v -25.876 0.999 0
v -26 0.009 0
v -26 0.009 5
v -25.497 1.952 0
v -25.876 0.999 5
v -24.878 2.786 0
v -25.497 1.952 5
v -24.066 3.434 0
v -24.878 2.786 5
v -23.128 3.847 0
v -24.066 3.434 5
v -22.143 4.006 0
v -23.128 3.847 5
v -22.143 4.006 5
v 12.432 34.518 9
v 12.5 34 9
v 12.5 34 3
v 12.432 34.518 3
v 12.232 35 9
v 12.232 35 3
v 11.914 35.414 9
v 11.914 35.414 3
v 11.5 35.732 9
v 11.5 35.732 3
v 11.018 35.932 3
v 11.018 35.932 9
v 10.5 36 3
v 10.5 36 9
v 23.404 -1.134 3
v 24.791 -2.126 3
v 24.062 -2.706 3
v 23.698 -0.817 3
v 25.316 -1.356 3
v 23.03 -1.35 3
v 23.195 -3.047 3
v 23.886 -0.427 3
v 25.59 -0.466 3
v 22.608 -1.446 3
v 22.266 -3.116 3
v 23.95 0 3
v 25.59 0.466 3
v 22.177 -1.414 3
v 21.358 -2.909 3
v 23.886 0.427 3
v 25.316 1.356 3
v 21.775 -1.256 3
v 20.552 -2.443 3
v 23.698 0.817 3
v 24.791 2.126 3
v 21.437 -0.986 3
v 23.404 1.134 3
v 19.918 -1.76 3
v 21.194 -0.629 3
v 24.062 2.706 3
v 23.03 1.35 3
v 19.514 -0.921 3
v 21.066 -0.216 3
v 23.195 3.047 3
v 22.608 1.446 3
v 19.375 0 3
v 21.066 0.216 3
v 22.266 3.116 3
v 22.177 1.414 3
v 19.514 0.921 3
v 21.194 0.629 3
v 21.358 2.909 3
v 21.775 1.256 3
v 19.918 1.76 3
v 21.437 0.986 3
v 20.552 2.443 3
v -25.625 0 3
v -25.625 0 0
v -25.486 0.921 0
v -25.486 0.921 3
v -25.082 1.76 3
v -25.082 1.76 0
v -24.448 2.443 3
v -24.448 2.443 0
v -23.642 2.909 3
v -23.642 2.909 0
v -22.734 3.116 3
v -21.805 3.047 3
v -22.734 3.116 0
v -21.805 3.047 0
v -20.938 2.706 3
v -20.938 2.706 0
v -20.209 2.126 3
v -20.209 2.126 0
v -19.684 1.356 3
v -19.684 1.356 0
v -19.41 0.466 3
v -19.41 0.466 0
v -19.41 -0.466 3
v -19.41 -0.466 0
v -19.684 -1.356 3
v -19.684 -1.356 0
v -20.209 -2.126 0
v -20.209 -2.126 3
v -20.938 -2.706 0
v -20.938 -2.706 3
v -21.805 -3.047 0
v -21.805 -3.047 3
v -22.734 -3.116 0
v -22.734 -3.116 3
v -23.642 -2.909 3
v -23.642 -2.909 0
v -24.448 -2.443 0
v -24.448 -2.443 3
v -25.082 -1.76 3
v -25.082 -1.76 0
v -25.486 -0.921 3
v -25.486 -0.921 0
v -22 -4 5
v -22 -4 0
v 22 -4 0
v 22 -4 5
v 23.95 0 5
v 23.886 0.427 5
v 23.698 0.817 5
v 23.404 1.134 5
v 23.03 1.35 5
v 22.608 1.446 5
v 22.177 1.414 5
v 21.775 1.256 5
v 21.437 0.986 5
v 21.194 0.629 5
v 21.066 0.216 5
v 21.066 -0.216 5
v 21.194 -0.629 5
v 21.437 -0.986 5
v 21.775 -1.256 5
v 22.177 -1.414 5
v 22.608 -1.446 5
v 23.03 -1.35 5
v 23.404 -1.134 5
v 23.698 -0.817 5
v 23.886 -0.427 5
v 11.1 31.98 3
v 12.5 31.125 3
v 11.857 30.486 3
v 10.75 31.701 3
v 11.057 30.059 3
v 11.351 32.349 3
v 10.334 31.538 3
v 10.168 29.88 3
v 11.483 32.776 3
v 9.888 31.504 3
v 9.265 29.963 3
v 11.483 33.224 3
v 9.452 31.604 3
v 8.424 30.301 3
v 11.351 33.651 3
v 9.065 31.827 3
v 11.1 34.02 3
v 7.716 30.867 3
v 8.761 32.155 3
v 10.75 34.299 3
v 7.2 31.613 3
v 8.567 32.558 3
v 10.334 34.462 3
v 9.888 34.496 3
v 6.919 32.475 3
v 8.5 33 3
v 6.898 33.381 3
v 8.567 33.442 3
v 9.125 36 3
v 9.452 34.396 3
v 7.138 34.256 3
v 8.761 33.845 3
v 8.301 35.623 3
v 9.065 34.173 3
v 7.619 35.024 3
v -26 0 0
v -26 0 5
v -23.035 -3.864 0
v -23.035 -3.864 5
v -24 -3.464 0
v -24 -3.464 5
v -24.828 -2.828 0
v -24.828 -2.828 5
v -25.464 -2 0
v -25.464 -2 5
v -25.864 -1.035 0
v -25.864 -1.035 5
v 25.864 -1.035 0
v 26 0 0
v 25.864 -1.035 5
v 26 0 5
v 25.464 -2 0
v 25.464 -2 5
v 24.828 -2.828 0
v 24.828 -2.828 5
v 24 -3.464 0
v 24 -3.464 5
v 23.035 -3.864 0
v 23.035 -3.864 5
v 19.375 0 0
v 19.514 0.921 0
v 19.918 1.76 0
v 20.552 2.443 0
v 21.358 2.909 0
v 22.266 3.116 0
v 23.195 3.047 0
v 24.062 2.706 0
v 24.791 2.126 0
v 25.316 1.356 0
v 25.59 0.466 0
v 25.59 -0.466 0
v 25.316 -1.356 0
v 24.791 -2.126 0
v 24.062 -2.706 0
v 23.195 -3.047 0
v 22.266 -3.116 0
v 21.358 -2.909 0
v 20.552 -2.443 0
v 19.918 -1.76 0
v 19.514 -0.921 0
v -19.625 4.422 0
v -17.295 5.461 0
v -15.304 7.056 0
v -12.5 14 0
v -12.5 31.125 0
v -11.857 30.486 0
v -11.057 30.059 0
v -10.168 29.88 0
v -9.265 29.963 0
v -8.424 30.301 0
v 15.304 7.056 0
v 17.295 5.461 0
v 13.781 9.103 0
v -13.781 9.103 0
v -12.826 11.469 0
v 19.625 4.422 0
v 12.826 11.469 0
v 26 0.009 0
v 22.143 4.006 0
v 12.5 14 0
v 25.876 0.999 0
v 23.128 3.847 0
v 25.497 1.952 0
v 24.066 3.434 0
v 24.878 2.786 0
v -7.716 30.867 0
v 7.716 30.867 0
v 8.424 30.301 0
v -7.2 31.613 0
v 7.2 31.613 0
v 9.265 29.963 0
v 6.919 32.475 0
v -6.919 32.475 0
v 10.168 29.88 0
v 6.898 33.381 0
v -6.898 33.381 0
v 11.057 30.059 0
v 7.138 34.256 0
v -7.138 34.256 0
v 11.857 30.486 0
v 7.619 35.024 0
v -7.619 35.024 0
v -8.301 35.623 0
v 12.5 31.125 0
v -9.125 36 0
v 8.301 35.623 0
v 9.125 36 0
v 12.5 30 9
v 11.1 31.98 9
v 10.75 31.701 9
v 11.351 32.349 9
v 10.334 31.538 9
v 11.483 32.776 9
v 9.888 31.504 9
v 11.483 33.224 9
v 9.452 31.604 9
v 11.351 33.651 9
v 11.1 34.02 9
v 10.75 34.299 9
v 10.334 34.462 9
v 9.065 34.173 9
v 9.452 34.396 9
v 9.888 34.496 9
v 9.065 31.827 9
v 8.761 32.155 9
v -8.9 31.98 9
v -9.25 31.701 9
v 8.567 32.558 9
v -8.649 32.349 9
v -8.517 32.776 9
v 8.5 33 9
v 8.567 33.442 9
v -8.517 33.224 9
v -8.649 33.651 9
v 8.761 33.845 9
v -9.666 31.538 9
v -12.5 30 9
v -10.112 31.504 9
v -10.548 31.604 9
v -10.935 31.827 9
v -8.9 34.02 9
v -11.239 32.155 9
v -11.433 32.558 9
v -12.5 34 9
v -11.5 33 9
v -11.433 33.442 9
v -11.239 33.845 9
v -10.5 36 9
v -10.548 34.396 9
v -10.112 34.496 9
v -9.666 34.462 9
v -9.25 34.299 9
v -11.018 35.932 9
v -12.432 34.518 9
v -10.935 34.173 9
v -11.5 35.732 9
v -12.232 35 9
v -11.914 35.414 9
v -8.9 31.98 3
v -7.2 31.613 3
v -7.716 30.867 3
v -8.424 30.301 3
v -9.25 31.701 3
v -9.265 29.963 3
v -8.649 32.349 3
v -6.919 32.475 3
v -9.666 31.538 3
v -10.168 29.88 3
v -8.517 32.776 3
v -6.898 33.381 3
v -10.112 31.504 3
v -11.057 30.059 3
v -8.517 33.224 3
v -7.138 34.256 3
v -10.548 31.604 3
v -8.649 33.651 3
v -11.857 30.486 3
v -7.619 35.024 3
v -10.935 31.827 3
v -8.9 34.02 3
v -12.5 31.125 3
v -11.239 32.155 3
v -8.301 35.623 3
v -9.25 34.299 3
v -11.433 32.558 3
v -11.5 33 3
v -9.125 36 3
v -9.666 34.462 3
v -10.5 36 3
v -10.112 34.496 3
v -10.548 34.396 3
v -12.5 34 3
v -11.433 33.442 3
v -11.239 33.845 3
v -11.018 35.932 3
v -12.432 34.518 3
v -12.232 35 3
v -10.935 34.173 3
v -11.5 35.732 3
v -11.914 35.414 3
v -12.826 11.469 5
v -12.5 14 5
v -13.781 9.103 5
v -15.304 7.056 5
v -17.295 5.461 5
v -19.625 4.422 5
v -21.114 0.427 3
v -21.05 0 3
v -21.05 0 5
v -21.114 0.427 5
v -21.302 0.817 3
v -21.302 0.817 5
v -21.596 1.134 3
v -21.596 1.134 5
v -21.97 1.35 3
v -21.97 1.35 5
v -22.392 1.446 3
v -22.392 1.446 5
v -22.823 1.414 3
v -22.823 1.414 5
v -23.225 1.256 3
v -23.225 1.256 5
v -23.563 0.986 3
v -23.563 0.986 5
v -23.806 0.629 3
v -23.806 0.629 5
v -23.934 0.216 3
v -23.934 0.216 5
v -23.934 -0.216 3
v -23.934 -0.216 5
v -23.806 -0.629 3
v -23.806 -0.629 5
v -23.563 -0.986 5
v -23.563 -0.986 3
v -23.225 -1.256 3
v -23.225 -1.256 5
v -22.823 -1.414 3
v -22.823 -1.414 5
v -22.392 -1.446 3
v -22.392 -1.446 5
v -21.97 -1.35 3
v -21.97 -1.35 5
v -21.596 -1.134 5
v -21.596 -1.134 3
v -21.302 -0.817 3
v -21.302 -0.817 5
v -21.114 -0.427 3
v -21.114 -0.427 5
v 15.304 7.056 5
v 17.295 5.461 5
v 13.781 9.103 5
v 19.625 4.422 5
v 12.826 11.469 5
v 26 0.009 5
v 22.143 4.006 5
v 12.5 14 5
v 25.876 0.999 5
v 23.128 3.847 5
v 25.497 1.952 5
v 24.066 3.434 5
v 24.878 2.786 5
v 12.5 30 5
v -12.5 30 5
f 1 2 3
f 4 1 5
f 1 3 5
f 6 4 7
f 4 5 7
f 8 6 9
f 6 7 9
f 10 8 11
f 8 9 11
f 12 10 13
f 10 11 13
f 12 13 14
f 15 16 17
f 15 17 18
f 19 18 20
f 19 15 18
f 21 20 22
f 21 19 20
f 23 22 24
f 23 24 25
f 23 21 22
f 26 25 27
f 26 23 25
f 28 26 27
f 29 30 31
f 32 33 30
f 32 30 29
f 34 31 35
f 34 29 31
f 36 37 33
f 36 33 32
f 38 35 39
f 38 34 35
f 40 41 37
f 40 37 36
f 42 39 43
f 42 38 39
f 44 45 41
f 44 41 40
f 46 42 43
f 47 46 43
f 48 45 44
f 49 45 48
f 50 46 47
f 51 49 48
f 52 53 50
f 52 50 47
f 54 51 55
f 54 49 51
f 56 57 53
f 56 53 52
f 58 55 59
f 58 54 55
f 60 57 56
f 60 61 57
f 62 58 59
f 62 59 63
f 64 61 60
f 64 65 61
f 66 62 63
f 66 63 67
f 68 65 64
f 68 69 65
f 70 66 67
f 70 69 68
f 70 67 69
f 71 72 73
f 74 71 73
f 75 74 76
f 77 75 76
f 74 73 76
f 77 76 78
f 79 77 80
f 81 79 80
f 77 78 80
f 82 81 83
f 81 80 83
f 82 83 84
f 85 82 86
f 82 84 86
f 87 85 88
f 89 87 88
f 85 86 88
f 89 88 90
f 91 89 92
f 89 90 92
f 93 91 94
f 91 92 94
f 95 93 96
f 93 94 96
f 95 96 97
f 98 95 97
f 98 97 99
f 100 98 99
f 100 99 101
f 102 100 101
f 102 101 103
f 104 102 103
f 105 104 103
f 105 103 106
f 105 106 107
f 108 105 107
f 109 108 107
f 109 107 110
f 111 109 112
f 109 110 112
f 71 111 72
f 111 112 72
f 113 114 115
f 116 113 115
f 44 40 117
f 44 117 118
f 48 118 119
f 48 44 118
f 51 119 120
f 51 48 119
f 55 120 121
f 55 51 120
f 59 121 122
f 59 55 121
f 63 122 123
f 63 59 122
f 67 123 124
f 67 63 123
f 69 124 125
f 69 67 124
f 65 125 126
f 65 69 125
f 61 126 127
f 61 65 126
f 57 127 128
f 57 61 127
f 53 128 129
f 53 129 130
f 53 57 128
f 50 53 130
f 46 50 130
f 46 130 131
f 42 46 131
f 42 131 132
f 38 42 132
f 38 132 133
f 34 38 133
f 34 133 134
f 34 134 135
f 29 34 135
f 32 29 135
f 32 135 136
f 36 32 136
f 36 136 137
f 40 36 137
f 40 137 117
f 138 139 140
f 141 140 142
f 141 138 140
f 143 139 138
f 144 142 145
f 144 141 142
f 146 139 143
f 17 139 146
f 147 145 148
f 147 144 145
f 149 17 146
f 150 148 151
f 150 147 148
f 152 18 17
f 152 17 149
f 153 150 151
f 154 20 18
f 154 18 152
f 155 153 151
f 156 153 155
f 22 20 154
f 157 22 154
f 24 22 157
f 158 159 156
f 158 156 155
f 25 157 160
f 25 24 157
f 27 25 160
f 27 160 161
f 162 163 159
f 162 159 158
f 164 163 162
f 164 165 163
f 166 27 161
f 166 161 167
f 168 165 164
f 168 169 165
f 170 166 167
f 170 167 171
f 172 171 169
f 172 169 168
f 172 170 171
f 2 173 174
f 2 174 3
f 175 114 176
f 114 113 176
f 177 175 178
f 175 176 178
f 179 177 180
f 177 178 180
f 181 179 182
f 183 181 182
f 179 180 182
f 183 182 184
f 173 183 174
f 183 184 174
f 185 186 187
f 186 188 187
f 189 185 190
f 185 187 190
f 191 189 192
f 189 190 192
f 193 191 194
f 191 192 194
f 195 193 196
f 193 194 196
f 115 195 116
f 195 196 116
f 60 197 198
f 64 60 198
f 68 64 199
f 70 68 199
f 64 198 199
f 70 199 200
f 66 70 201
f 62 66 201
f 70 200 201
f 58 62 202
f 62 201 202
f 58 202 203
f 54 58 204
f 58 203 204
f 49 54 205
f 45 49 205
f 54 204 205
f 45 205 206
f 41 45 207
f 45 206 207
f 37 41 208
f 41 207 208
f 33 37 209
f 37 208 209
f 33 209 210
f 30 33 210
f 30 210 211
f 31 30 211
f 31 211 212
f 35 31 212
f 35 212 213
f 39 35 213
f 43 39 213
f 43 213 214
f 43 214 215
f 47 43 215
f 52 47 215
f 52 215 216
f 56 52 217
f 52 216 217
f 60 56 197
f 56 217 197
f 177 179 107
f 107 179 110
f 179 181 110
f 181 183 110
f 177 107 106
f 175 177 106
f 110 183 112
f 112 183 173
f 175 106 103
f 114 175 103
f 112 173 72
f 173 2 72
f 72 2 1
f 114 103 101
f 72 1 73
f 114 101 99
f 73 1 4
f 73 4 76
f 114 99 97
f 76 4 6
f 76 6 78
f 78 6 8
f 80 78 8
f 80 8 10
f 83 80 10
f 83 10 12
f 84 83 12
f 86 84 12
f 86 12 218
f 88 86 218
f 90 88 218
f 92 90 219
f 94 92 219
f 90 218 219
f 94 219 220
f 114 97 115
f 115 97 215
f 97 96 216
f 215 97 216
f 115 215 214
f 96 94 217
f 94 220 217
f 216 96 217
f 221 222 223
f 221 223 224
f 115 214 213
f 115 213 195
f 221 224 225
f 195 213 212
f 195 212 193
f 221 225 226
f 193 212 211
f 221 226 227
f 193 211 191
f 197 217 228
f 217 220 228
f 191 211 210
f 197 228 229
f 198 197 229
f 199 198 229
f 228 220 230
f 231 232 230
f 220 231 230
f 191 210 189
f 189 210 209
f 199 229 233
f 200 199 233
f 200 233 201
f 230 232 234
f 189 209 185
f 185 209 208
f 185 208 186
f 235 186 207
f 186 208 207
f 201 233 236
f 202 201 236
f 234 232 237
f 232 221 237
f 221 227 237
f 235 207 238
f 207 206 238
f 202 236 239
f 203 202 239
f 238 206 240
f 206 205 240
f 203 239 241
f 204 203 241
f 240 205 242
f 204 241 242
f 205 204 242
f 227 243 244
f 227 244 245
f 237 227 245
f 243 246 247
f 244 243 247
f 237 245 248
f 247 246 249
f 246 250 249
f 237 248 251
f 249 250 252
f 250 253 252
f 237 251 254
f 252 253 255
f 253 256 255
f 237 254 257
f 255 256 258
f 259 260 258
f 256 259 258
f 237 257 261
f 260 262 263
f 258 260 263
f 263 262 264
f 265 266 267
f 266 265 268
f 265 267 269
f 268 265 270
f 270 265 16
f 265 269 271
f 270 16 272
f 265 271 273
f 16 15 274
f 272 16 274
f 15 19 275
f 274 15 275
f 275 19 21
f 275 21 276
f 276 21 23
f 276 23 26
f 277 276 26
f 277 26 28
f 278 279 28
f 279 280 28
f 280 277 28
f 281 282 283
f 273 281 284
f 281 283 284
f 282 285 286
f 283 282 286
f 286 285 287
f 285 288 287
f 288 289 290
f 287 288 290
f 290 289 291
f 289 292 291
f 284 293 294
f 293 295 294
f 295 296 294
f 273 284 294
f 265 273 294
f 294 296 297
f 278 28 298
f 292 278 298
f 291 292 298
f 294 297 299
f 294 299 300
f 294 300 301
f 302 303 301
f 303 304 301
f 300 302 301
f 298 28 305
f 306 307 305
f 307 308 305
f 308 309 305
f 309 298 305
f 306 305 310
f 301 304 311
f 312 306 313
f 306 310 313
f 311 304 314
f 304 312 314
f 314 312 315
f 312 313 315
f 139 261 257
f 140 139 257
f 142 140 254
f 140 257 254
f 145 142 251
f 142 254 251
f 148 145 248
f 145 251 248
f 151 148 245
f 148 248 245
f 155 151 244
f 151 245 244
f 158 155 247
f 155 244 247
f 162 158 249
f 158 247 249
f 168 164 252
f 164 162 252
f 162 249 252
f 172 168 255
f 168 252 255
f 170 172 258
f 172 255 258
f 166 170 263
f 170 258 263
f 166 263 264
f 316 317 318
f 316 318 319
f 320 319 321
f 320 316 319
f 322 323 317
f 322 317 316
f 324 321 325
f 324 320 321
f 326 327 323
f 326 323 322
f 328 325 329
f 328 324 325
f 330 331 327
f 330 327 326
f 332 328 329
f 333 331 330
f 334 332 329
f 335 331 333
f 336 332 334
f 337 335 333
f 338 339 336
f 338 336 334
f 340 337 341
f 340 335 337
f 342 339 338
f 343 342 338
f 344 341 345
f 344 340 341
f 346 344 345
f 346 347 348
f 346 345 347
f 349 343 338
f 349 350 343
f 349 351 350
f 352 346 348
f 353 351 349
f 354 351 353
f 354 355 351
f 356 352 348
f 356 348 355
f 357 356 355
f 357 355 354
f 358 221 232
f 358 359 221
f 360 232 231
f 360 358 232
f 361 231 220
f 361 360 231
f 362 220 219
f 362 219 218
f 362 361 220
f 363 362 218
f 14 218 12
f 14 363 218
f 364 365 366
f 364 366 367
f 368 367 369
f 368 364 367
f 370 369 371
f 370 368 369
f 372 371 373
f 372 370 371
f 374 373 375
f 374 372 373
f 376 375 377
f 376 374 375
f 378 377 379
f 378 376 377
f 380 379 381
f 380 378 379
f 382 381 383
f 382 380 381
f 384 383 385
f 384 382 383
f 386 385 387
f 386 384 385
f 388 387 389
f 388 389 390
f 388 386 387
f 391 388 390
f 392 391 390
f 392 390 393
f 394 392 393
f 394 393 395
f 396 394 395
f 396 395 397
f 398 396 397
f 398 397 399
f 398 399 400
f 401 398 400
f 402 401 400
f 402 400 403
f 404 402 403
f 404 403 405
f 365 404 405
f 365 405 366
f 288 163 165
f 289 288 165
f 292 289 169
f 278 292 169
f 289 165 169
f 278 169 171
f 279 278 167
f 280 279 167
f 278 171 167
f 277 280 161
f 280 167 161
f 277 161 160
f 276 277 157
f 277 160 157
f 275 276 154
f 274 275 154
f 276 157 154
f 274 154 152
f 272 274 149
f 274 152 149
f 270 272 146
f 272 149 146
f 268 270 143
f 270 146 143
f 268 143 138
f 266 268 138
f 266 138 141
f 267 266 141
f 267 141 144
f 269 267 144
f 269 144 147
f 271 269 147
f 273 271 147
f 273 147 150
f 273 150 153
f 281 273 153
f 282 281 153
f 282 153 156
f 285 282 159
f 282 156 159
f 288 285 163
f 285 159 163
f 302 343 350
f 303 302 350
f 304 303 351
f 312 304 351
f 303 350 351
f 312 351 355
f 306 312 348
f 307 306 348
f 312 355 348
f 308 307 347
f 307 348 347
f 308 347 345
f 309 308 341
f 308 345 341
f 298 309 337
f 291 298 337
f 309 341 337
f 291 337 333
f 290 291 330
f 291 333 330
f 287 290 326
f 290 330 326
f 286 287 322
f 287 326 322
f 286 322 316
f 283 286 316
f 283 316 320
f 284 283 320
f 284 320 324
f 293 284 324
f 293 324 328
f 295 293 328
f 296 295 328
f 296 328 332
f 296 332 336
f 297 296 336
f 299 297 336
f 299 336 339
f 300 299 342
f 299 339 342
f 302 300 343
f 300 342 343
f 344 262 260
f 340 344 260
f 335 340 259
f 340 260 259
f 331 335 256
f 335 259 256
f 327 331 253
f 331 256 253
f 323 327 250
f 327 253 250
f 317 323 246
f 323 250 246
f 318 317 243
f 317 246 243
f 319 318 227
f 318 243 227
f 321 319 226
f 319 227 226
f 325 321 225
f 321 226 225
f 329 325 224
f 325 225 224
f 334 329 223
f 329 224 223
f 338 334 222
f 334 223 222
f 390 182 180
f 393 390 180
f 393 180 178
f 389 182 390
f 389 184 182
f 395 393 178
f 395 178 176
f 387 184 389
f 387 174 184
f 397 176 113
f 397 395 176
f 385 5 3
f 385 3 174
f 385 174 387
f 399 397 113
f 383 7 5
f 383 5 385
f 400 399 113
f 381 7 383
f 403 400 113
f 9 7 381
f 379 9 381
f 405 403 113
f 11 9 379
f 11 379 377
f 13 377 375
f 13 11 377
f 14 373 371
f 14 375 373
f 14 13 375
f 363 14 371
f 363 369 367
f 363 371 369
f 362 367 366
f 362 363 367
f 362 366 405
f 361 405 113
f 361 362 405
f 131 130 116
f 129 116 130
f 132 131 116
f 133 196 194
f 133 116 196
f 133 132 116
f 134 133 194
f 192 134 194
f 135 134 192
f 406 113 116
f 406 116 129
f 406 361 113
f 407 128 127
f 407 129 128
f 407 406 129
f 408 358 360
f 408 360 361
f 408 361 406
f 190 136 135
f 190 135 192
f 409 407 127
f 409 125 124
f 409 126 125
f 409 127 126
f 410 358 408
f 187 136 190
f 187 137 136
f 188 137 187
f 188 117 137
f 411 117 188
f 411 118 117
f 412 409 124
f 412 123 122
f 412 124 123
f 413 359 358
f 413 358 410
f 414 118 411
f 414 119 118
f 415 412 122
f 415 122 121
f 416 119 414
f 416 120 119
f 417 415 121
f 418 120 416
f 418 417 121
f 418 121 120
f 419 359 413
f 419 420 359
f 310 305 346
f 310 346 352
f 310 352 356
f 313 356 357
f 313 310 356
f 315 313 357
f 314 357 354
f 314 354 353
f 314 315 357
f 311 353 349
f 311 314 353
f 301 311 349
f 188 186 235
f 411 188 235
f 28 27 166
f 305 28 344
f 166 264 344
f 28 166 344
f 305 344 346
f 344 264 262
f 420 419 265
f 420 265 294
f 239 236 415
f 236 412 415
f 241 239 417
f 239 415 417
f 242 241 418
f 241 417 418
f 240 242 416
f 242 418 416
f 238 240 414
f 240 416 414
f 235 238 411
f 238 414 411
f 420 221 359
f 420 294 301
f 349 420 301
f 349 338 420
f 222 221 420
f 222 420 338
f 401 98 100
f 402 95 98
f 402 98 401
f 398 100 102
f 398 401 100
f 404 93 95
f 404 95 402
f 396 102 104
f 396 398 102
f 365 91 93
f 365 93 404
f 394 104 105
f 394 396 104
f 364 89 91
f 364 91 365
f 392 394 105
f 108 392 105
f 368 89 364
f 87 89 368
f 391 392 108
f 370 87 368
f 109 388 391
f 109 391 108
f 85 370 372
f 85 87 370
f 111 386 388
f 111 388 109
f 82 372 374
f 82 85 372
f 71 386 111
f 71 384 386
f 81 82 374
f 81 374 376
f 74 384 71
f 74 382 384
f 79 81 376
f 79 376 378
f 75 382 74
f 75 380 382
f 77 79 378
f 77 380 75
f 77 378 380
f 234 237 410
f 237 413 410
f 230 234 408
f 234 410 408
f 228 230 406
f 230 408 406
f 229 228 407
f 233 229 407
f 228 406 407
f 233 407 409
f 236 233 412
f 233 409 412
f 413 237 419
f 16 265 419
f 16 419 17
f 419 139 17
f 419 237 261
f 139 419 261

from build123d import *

# Parameters (mm, degrees)
SKETCH_1_W          = 52
SKETCH_1_H          = 8
SKETCH_1_R          = 1.45
EXTRUDE_1_DEPTH     = 5
SKETCH_2_W          = 25
SKETCH_2_H          = 32
SKETCH_2_R          = 1.5
EXTRUDE_2_DEPTH     = 5
SKETCH_3_W          = 25
SKETCH_3_H          = 6
SKETCH_3_R          = 1.5
EXTRUDE_3_DEPTH     = 4
FILLET_1_R          = 10
FILLET_2_R          = 4
FILLET_3_R          = 2
SKETCH_4_R          = 3.125
CUT_EXTRUDE_3_DEPTH = 3


with BuildPart() as part:
    # Эскиз1 → Бобышка-Вытянуть1 (new body)
    with BuildSketch(Plane.XY):
        Rectangle(SKETCH_1_W, SKETCH_1_H)
        with Locations((-22.5, 0)):
            Circle(SKETCH_1_R, mode=Mode.SUBTRACT)
        with Locations((22.5, 0)):
            Circle(SKETCH_1_R, mode=Mode.SUBTRACT)
    extrude(amount=EXTRUDE_1_DEPTH)

    # Эскиз2 → Бобышка-Вытянуть2 (add)
    with BuildSketch(Plane(origin=(0, 0, 0), x_dir=(-1, 0, 0), z_dir=(0, 0, -1))):
        with Locations((0, 20)):
            Rectangle(SKETCH_2_W, SKETCH_2_H)
        with Locations((-10, 33)):
            Circle(SKETCH_2_R, mode=Mode.SUBTRACT)
        with Locations((10, 33)):
            Circle(SKETCH_2_R, mode=Mode.SUBTRACT)
    extrude(amount=-EXTRUDE_2_DEPTH)

    # Эскиз3 → Бобышка-Вытянуть3 (add)
    with BuildSketch(Plane(origin=(0, 0, 5), x_dir=(-1, 0, 0), z_dir=(0, 0, -1))):
        with Locations((0, 33)):
            Rectangle(SKETCH_3_W, SKETCH_3_H)
        with Locations((10, 33)):
            Circle(SKETCH_3_R, mode=Mode.SUBTRACT)
        with Locations((-10, 33)):
            Circle(SKETCH_3_R, mode=Mode.SUBTRACT)
    extrude(amount=-EXTRUDE_3_DEPTH)

    # Скругление1
    fillet_1_edges = [part.edges().sort_by_distance(p)[0] for p in [
        (12.5, 4, 2.5),
        (-12.5, 4, 2.5),
    ]]
    fillet(fillet_1_edges, radius=FILLET_1_R)

    # Скругление2
    fillet_2_edges = [part.edges().sort_by_distance(p)[0] for p in [
        (-26, -4, 2.5),
        (-26, 4, 2.5),
        (26, -4, 2.5),
        (26, 4, 2.5),
    ]]
    fillet(fillet_2_edges, radius=FILLET_2_R)

    # Скругление3
    fillet_3_edges = [part.edges().sort_by_distance(p)[0] for p in [
        (12.5, 36, 4.5),
        (-12.5, 36, 4.5),
    ]]
    fillet(fillet_3_edges, radius=FILLET_3_R)

    # Эскиз4 → Вырез-Вытянуть3 (cut)
    with BuildSketch(Plane(origin=(0, 0, 0), x_dir=(-1, 0, 0), z_dir=(0, 0, -1))):
        with Locations((-10, 33)):
            Circle(SKETCH_4_R)
        with Locations((10, 33)):
            Circle(SKETCH_4_R)
        with Locations((-22.5, 0)):
            Circle(SKETCH_4_R)
        with Locations((22.5, 0)):
            Circle(SKETCH_4_R)
    extrude(amount=-CUT_EXTRUDE_3_DEPTH, mode=Mode.SUBTRACT)


solid = part.part
